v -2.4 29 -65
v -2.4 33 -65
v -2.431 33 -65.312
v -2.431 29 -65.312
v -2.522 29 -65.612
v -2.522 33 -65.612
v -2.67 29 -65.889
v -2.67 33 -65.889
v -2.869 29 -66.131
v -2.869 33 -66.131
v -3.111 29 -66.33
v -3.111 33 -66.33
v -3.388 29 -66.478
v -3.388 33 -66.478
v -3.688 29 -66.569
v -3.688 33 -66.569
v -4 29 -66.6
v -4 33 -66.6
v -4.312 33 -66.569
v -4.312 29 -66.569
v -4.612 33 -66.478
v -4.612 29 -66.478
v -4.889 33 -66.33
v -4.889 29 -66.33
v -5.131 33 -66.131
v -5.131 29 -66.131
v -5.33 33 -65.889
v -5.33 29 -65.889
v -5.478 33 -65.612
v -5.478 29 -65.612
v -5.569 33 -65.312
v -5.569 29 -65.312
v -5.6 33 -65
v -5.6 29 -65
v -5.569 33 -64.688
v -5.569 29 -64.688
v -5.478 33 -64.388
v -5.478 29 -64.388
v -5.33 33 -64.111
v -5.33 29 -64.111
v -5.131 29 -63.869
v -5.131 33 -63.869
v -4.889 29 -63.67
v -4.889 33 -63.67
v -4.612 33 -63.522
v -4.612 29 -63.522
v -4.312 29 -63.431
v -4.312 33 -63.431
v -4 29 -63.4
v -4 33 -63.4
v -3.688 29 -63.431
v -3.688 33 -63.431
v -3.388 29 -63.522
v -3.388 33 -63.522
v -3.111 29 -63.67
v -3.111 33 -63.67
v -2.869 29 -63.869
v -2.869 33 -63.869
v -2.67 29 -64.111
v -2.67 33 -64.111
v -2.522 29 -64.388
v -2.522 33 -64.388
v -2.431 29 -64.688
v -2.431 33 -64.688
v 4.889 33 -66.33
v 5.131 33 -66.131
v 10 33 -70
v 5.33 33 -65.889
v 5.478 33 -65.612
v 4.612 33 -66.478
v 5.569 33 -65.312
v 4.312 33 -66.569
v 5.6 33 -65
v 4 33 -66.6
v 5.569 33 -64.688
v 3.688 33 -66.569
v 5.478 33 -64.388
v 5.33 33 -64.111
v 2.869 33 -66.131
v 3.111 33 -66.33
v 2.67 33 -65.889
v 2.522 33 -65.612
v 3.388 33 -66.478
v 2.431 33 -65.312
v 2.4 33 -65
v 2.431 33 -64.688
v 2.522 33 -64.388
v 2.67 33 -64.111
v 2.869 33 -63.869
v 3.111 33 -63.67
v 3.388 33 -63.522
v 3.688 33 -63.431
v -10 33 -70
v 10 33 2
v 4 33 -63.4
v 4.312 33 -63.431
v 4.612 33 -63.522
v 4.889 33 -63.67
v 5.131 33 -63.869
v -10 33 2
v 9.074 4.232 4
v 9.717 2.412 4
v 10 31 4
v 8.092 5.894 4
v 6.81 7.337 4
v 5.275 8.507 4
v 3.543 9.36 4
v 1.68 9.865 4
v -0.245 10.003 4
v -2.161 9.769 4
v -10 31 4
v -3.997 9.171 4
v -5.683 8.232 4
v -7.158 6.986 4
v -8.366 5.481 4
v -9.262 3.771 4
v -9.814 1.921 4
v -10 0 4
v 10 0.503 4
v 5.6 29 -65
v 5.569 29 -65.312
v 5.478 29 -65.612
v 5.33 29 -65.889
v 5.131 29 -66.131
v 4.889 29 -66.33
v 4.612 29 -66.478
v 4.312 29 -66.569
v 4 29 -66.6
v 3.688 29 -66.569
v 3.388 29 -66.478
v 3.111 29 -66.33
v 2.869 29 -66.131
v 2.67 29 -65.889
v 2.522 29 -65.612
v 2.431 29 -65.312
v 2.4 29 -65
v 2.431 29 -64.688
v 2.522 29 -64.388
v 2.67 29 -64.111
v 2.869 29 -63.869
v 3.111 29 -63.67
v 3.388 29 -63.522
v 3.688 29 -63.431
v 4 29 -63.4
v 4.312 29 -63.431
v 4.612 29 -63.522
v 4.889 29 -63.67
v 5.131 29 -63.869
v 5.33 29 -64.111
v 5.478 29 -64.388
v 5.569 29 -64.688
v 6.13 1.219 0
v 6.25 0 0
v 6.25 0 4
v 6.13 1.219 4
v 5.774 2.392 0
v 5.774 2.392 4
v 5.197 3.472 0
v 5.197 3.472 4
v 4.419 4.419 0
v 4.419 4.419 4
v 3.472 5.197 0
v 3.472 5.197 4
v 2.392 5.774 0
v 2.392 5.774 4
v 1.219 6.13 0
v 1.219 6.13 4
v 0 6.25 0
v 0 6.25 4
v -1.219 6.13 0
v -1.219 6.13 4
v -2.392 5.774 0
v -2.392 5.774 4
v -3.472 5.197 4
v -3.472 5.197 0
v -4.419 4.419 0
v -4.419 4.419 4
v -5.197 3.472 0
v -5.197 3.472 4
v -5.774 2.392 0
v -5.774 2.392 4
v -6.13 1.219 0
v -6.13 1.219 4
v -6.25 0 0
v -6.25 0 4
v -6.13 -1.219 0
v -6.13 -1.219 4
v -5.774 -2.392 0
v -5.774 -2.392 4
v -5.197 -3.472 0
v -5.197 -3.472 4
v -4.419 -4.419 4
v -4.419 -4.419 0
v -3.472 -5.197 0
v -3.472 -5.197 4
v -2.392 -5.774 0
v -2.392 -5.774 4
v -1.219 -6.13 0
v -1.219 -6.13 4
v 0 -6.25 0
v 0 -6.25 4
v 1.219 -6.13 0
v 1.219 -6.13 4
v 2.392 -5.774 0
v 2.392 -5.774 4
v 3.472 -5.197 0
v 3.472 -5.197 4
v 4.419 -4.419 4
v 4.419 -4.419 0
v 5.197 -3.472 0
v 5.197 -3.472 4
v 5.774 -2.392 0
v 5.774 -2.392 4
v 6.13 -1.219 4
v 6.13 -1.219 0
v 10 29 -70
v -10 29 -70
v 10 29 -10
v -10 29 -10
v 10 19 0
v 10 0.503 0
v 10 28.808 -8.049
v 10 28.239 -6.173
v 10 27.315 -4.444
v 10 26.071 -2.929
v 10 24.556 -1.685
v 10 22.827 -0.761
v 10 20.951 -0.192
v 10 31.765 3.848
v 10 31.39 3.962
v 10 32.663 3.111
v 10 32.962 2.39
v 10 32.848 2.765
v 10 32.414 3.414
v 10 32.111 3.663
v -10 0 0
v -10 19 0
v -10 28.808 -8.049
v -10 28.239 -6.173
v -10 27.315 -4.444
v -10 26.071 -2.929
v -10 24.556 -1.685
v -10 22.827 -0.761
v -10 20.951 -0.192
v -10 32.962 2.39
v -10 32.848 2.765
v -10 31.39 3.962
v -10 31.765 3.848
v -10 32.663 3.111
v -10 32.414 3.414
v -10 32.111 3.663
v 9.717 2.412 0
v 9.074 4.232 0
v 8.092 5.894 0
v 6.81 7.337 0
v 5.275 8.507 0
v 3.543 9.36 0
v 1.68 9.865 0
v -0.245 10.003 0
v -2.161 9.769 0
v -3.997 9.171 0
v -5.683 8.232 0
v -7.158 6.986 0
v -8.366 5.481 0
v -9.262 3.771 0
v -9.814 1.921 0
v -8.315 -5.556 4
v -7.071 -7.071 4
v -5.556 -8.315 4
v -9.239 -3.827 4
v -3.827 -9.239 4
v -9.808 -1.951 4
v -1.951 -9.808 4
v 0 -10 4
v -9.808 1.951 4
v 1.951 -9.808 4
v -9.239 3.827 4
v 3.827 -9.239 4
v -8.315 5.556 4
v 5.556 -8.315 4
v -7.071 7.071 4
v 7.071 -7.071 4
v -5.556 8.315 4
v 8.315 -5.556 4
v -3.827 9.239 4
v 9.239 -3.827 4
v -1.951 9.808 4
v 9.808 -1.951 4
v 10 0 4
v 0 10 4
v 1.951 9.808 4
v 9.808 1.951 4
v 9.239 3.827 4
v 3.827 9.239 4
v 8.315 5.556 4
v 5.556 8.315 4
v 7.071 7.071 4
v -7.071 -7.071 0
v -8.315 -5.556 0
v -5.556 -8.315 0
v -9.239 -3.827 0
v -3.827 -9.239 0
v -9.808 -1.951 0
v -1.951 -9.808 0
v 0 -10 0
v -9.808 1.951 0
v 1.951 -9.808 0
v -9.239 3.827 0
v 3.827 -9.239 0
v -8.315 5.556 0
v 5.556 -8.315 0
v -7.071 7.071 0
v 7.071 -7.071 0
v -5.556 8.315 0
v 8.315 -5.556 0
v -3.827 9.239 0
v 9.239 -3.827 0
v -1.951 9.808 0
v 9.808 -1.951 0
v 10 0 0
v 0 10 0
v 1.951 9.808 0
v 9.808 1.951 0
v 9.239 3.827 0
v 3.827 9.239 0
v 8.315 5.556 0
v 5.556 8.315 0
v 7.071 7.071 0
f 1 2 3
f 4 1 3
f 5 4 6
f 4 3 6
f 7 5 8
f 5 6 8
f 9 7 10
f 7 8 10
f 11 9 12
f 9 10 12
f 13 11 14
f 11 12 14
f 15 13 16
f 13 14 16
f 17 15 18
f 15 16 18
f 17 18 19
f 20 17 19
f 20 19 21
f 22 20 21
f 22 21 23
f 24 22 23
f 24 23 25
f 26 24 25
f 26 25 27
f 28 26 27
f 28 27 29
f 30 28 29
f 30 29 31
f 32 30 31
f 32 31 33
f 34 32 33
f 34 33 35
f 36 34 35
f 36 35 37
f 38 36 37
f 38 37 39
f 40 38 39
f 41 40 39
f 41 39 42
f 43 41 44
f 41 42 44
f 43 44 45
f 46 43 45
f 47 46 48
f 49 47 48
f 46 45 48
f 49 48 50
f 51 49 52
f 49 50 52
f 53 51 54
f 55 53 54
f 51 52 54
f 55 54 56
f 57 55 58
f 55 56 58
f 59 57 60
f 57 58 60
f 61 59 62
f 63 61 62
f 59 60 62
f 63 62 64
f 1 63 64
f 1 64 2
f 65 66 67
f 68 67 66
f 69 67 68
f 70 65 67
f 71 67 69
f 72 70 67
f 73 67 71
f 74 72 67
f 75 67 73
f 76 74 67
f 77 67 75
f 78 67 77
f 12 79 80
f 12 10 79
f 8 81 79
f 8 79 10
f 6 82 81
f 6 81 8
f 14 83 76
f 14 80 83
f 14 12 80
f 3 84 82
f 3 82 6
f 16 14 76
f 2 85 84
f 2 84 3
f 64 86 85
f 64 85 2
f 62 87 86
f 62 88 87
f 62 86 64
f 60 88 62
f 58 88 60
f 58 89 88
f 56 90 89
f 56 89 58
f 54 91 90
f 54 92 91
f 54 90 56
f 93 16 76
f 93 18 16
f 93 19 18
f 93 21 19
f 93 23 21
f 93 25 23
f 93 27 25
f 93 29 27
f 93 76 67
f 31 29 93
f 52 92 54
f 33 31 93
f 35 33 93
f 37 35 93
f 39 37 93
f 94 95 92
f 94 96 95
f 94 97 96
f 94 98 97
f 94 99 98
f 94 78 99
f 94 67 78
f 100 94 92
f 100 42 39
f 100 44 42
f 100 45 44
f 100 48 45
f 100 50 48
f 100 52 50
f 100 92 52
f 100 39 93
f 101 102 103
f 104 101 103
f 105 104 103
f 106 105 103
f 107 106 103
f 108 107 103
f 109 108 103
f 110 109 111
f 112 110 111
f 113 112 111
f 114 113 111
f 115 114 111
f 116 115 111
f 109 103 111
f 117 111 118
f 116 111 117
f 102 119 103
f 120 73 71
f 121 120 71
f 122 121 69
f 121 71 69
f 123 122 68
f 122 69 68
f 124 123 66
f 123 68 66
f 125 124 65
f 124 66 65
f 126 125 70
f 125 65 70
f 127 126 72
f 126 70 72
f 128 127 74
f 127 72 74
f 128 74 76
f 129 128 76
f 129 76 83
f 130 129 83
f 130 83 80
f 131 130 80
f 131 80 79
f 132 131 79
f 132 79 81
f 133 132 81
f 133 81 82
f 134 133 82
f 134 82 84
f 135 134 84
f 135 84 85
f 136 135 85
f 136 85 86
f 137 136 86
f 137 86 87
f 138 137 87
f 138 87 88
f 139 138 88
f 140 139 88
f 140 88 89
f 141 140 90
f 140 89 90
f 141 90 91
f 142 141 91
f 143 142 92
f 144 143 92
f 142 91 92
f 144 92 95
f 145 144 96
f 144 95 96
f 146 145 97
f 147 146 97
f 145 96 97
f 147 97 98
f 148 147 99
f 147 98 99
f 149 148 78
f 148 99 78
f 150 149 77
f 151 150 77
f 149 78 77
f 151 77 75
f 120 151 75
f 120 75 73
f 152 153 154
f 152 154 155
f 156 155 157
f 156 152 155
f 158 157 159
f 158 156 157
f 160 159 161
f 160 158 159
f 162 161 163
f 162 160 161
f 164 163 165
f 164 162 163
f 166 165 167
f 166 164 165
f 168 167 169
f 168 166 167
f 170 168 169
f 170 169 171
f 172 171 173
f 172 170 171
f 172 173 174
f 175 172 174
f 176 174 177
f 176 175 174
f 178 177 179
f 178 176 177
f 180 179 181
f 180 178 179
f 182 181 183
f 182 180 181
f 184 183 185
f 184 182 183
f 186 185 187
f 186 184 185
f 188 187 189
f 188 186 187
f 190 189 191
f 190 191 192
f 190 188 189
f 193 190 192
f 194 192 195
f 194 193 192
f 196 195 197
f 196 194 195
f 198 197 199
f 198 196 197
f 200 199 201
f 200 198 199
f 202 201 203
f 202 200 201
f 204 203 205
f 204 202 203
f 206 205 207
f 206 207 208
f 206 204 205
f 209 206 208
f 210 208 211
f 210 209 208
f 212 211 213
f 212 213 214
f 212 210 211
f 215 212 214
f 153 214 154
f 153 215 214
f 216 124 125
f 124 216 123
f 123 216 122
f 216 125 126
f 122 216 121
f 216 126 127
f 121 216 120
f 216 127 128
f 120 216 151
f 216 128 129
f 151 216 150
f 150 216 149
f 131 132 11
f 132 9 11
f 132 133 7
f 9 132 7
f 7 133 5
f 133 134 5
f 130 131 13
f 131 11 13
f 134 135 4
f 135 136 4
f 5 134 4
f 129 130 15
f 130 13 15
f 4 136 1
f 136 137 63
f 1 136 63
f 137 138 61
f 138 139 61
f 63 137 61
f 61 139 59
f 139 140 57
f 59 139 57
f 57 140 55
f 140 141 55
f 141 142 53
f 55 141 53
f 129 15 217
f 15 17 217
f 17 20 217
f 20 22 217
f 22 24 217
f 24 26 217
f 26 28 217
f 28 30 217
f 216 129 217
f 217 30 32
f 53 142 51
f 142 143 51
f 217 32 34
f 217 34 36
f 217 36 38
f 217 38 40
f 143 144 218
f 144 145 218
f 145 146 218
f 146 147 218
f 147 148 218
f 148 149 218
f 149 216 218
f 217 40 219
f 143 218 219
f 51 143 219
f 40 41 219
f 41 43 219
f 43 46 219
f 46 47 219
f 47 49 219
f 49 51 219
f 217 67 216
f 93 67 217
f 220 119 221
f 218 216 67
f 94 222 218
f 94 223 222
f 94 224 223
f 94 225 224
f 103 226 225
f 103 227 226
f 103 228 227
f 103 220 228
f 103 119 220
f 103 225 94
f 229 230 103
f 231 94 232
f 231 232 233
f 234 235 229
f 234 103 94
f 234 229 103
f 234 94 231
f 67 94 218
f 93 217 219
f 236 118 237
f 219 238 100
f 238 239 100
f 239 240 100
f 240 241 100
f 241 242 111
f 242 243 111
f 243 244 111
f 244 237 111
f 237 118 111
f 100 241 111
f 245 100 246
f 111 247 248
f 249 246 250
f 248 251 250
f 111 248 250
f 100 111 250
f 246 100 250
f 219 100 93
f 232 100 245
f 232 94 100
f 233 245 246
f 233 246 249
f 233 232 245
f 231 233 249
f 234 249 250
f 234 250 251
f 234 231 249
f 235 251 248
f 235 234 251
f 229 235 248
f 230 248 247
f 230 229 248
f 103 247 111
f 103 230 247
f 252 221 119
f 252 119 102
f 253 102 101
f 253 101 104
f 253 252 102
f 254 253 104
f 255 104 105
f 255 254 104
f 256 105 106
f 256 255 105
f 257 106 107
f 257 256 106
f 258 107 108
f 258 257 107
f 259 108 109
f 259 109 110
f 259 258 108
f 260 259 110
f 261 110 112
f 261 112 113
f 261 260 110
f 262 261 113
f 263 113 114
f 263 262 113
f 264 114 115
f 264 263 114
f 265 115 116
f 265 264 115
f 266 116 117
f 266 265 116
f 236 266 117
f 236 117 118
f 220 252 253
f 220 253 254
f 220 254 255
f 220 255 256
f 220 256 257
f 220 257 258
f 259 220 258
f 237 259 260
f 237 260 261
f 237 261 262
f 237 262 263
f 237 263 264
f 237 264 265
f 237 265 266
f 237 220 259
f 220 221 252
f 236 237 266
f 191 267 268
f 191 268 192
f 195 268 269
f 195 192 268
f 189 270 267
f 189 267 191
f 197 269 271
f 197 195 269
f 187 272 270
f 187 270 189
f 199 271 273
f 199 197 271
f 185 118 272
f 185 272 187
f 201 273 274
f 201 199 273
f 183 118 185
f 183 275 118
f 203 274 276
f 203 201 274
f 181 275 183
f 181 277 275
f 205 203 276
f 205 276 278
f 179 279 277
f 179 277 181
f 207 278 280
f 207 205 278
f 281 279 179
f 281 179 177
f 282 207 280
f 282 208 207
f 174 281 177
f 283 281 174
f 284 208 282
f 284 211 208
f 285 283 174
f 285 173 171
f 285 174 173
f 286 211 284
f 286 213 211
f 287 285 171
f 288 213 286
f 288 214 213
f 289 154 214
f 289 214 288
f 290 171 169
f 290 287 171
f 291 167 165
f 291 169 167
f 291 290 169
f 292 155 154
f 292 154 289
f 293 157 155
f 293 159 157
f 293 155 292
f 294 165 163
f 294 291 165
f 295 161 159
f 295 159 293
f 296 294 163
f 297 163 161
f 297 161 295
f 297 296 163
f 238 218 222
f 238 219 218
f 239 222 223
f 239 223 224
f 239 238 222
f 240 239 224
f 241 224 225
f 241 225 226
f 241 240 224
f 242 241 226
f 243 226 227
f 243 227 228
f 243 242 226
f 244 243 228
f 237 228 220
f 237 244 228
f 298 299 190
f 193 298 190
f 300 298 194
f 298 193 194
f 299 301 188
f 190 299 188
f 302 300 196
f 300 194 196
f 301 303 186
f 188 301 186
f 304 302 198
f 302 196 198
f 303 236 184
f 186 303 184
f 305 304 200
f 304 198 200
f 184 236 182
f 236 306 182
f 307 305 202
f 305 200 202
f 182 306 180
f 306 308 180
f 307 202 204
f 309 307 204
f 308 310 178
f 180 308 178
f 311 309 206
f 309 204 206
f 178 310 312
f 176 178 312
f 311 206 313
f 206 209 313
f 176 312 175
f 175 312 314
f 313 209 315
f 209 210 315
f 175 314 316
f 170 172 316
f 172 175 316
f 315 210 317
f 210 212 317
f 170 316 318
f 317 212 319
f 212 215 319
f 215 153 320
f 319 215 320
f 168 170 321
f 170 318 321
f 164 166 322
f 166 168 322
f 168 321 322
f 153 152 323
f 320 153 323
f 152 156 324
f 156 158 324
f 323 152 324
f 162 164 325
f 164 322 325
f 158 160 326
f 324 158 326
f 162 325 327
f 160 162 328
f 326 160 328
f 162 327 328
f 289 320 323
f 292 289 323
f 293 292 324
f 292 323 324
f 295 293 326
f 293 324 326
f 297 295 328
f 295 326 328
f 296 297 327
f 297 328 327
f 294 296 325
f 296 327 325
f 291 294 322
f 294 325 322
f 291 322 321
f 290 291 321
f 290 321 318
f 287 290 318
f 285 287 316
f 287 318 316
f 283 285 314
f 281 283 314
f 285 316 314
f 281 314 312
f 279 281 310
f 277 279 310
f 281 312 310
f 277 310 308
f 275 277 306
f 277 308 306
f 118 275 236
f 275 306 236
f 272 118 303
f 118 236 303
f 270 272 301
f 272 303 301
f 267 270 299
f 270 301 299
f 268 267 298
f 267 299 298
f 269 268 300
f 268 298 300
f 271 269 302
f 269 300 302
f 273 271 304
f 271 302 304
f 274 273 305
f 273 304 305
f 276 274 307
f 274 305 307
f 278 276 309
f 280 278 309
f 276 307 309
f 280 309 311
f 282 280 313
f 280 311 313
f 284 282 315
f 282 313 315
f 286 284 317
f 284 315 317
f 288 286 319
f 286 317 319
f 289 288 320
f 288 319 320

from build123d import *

# Parameters (mm, degrees)
SALIENTE_EXTRUIR1_DEPTH   = 4
CROQUIS1_R                = 10
CROQUIS1_R_2              = 6.25
SALIENTE_EXTRUIR1_2_DEPTH = 4
CROQUIS2_W                = 20
CROQUIS2_H                = 4
SALIENTE_EXTRUIR2_DEPTH   = 70
CROQUIS3_R                = 1.6
CORTAR_EXTRUIR1_DEPTH     = 10
REDONDEO1_R               = 10
REDONDEO2_R               = 2


with BuildPart() as part:
    # Croquis1 → Saliente-Extruir1 (new body)
    with BuildSketch(Plane.XY):
        with BuildLine():
            Line((-10, 0), (-10, 33))
            Line((-10, 33), (10, 33))
            Line((10, 33), (10, 0.502965573))
            ThreePointArc((10, 0.502965573), (-0.245237938, 10.00316168), (-10, 0))
        make_face()
    extrude(amount=SALIENTE_EXTRUIR1_DEPTH)

    # Croquis2 → Saliente-Extruir2 (add)
    with BuildSketch(Plane(origin=(0, 0, 0), x_dir=(-1, 0, 0), z_dir=(0, 0, -1))):
        with Locations((0, 31)):
            Rectangle(CROQUIS2_W, CROQUIS2_H)
    extrude(amount=SALIENTE_EXTRUIR2_DEPTH)

    # Croquis3 → Cortar-Extruir1 (cut)
    with BuildSketch(Plane(origin=(0, 33, 0), x_dir=(1, 0, 0), z_dir=(0, 1, 0))):
        with Locations((-4, 65)):
            Circle(CROQUIS3_R)
        with Locations((4, 65)):
            Circle(CROQUIS3_R)
    extrude(amount=-CORTAR_EXTRUIR1_DEPTH, mode=Mode.SUBTRACT)

    # Redondeo1
    redondeo1_edges = [part.edges().sort_by_distance(p)[0] for p in [
        (0, 29, 0),
    ]]
    fillet(redondeo1_edges, radius=REDONDEO1_R)

    # Redondeo2
    redondeo2_edges = [part.edges().sort_by_distance(p)[0] for p in [
        (0, 33, 4),
    ]]
    fillet(redondeo2_edges, radius=REDONDEO2_R)


with BuildPart() as body_2:
    # Croquis1 → Saliente-Extruir1 2 (new body)
    with BuildSketch(Plane.XY):
        Circle(CROQUIS1_R)
        Circle(CROQUIS1_R_2, mode=Mode.SUBTRACT)
    extrude(amount=SALIENTE_EXTRUIR1_2_DEPTH)


solid = Compound([part.part, body_2.part])
